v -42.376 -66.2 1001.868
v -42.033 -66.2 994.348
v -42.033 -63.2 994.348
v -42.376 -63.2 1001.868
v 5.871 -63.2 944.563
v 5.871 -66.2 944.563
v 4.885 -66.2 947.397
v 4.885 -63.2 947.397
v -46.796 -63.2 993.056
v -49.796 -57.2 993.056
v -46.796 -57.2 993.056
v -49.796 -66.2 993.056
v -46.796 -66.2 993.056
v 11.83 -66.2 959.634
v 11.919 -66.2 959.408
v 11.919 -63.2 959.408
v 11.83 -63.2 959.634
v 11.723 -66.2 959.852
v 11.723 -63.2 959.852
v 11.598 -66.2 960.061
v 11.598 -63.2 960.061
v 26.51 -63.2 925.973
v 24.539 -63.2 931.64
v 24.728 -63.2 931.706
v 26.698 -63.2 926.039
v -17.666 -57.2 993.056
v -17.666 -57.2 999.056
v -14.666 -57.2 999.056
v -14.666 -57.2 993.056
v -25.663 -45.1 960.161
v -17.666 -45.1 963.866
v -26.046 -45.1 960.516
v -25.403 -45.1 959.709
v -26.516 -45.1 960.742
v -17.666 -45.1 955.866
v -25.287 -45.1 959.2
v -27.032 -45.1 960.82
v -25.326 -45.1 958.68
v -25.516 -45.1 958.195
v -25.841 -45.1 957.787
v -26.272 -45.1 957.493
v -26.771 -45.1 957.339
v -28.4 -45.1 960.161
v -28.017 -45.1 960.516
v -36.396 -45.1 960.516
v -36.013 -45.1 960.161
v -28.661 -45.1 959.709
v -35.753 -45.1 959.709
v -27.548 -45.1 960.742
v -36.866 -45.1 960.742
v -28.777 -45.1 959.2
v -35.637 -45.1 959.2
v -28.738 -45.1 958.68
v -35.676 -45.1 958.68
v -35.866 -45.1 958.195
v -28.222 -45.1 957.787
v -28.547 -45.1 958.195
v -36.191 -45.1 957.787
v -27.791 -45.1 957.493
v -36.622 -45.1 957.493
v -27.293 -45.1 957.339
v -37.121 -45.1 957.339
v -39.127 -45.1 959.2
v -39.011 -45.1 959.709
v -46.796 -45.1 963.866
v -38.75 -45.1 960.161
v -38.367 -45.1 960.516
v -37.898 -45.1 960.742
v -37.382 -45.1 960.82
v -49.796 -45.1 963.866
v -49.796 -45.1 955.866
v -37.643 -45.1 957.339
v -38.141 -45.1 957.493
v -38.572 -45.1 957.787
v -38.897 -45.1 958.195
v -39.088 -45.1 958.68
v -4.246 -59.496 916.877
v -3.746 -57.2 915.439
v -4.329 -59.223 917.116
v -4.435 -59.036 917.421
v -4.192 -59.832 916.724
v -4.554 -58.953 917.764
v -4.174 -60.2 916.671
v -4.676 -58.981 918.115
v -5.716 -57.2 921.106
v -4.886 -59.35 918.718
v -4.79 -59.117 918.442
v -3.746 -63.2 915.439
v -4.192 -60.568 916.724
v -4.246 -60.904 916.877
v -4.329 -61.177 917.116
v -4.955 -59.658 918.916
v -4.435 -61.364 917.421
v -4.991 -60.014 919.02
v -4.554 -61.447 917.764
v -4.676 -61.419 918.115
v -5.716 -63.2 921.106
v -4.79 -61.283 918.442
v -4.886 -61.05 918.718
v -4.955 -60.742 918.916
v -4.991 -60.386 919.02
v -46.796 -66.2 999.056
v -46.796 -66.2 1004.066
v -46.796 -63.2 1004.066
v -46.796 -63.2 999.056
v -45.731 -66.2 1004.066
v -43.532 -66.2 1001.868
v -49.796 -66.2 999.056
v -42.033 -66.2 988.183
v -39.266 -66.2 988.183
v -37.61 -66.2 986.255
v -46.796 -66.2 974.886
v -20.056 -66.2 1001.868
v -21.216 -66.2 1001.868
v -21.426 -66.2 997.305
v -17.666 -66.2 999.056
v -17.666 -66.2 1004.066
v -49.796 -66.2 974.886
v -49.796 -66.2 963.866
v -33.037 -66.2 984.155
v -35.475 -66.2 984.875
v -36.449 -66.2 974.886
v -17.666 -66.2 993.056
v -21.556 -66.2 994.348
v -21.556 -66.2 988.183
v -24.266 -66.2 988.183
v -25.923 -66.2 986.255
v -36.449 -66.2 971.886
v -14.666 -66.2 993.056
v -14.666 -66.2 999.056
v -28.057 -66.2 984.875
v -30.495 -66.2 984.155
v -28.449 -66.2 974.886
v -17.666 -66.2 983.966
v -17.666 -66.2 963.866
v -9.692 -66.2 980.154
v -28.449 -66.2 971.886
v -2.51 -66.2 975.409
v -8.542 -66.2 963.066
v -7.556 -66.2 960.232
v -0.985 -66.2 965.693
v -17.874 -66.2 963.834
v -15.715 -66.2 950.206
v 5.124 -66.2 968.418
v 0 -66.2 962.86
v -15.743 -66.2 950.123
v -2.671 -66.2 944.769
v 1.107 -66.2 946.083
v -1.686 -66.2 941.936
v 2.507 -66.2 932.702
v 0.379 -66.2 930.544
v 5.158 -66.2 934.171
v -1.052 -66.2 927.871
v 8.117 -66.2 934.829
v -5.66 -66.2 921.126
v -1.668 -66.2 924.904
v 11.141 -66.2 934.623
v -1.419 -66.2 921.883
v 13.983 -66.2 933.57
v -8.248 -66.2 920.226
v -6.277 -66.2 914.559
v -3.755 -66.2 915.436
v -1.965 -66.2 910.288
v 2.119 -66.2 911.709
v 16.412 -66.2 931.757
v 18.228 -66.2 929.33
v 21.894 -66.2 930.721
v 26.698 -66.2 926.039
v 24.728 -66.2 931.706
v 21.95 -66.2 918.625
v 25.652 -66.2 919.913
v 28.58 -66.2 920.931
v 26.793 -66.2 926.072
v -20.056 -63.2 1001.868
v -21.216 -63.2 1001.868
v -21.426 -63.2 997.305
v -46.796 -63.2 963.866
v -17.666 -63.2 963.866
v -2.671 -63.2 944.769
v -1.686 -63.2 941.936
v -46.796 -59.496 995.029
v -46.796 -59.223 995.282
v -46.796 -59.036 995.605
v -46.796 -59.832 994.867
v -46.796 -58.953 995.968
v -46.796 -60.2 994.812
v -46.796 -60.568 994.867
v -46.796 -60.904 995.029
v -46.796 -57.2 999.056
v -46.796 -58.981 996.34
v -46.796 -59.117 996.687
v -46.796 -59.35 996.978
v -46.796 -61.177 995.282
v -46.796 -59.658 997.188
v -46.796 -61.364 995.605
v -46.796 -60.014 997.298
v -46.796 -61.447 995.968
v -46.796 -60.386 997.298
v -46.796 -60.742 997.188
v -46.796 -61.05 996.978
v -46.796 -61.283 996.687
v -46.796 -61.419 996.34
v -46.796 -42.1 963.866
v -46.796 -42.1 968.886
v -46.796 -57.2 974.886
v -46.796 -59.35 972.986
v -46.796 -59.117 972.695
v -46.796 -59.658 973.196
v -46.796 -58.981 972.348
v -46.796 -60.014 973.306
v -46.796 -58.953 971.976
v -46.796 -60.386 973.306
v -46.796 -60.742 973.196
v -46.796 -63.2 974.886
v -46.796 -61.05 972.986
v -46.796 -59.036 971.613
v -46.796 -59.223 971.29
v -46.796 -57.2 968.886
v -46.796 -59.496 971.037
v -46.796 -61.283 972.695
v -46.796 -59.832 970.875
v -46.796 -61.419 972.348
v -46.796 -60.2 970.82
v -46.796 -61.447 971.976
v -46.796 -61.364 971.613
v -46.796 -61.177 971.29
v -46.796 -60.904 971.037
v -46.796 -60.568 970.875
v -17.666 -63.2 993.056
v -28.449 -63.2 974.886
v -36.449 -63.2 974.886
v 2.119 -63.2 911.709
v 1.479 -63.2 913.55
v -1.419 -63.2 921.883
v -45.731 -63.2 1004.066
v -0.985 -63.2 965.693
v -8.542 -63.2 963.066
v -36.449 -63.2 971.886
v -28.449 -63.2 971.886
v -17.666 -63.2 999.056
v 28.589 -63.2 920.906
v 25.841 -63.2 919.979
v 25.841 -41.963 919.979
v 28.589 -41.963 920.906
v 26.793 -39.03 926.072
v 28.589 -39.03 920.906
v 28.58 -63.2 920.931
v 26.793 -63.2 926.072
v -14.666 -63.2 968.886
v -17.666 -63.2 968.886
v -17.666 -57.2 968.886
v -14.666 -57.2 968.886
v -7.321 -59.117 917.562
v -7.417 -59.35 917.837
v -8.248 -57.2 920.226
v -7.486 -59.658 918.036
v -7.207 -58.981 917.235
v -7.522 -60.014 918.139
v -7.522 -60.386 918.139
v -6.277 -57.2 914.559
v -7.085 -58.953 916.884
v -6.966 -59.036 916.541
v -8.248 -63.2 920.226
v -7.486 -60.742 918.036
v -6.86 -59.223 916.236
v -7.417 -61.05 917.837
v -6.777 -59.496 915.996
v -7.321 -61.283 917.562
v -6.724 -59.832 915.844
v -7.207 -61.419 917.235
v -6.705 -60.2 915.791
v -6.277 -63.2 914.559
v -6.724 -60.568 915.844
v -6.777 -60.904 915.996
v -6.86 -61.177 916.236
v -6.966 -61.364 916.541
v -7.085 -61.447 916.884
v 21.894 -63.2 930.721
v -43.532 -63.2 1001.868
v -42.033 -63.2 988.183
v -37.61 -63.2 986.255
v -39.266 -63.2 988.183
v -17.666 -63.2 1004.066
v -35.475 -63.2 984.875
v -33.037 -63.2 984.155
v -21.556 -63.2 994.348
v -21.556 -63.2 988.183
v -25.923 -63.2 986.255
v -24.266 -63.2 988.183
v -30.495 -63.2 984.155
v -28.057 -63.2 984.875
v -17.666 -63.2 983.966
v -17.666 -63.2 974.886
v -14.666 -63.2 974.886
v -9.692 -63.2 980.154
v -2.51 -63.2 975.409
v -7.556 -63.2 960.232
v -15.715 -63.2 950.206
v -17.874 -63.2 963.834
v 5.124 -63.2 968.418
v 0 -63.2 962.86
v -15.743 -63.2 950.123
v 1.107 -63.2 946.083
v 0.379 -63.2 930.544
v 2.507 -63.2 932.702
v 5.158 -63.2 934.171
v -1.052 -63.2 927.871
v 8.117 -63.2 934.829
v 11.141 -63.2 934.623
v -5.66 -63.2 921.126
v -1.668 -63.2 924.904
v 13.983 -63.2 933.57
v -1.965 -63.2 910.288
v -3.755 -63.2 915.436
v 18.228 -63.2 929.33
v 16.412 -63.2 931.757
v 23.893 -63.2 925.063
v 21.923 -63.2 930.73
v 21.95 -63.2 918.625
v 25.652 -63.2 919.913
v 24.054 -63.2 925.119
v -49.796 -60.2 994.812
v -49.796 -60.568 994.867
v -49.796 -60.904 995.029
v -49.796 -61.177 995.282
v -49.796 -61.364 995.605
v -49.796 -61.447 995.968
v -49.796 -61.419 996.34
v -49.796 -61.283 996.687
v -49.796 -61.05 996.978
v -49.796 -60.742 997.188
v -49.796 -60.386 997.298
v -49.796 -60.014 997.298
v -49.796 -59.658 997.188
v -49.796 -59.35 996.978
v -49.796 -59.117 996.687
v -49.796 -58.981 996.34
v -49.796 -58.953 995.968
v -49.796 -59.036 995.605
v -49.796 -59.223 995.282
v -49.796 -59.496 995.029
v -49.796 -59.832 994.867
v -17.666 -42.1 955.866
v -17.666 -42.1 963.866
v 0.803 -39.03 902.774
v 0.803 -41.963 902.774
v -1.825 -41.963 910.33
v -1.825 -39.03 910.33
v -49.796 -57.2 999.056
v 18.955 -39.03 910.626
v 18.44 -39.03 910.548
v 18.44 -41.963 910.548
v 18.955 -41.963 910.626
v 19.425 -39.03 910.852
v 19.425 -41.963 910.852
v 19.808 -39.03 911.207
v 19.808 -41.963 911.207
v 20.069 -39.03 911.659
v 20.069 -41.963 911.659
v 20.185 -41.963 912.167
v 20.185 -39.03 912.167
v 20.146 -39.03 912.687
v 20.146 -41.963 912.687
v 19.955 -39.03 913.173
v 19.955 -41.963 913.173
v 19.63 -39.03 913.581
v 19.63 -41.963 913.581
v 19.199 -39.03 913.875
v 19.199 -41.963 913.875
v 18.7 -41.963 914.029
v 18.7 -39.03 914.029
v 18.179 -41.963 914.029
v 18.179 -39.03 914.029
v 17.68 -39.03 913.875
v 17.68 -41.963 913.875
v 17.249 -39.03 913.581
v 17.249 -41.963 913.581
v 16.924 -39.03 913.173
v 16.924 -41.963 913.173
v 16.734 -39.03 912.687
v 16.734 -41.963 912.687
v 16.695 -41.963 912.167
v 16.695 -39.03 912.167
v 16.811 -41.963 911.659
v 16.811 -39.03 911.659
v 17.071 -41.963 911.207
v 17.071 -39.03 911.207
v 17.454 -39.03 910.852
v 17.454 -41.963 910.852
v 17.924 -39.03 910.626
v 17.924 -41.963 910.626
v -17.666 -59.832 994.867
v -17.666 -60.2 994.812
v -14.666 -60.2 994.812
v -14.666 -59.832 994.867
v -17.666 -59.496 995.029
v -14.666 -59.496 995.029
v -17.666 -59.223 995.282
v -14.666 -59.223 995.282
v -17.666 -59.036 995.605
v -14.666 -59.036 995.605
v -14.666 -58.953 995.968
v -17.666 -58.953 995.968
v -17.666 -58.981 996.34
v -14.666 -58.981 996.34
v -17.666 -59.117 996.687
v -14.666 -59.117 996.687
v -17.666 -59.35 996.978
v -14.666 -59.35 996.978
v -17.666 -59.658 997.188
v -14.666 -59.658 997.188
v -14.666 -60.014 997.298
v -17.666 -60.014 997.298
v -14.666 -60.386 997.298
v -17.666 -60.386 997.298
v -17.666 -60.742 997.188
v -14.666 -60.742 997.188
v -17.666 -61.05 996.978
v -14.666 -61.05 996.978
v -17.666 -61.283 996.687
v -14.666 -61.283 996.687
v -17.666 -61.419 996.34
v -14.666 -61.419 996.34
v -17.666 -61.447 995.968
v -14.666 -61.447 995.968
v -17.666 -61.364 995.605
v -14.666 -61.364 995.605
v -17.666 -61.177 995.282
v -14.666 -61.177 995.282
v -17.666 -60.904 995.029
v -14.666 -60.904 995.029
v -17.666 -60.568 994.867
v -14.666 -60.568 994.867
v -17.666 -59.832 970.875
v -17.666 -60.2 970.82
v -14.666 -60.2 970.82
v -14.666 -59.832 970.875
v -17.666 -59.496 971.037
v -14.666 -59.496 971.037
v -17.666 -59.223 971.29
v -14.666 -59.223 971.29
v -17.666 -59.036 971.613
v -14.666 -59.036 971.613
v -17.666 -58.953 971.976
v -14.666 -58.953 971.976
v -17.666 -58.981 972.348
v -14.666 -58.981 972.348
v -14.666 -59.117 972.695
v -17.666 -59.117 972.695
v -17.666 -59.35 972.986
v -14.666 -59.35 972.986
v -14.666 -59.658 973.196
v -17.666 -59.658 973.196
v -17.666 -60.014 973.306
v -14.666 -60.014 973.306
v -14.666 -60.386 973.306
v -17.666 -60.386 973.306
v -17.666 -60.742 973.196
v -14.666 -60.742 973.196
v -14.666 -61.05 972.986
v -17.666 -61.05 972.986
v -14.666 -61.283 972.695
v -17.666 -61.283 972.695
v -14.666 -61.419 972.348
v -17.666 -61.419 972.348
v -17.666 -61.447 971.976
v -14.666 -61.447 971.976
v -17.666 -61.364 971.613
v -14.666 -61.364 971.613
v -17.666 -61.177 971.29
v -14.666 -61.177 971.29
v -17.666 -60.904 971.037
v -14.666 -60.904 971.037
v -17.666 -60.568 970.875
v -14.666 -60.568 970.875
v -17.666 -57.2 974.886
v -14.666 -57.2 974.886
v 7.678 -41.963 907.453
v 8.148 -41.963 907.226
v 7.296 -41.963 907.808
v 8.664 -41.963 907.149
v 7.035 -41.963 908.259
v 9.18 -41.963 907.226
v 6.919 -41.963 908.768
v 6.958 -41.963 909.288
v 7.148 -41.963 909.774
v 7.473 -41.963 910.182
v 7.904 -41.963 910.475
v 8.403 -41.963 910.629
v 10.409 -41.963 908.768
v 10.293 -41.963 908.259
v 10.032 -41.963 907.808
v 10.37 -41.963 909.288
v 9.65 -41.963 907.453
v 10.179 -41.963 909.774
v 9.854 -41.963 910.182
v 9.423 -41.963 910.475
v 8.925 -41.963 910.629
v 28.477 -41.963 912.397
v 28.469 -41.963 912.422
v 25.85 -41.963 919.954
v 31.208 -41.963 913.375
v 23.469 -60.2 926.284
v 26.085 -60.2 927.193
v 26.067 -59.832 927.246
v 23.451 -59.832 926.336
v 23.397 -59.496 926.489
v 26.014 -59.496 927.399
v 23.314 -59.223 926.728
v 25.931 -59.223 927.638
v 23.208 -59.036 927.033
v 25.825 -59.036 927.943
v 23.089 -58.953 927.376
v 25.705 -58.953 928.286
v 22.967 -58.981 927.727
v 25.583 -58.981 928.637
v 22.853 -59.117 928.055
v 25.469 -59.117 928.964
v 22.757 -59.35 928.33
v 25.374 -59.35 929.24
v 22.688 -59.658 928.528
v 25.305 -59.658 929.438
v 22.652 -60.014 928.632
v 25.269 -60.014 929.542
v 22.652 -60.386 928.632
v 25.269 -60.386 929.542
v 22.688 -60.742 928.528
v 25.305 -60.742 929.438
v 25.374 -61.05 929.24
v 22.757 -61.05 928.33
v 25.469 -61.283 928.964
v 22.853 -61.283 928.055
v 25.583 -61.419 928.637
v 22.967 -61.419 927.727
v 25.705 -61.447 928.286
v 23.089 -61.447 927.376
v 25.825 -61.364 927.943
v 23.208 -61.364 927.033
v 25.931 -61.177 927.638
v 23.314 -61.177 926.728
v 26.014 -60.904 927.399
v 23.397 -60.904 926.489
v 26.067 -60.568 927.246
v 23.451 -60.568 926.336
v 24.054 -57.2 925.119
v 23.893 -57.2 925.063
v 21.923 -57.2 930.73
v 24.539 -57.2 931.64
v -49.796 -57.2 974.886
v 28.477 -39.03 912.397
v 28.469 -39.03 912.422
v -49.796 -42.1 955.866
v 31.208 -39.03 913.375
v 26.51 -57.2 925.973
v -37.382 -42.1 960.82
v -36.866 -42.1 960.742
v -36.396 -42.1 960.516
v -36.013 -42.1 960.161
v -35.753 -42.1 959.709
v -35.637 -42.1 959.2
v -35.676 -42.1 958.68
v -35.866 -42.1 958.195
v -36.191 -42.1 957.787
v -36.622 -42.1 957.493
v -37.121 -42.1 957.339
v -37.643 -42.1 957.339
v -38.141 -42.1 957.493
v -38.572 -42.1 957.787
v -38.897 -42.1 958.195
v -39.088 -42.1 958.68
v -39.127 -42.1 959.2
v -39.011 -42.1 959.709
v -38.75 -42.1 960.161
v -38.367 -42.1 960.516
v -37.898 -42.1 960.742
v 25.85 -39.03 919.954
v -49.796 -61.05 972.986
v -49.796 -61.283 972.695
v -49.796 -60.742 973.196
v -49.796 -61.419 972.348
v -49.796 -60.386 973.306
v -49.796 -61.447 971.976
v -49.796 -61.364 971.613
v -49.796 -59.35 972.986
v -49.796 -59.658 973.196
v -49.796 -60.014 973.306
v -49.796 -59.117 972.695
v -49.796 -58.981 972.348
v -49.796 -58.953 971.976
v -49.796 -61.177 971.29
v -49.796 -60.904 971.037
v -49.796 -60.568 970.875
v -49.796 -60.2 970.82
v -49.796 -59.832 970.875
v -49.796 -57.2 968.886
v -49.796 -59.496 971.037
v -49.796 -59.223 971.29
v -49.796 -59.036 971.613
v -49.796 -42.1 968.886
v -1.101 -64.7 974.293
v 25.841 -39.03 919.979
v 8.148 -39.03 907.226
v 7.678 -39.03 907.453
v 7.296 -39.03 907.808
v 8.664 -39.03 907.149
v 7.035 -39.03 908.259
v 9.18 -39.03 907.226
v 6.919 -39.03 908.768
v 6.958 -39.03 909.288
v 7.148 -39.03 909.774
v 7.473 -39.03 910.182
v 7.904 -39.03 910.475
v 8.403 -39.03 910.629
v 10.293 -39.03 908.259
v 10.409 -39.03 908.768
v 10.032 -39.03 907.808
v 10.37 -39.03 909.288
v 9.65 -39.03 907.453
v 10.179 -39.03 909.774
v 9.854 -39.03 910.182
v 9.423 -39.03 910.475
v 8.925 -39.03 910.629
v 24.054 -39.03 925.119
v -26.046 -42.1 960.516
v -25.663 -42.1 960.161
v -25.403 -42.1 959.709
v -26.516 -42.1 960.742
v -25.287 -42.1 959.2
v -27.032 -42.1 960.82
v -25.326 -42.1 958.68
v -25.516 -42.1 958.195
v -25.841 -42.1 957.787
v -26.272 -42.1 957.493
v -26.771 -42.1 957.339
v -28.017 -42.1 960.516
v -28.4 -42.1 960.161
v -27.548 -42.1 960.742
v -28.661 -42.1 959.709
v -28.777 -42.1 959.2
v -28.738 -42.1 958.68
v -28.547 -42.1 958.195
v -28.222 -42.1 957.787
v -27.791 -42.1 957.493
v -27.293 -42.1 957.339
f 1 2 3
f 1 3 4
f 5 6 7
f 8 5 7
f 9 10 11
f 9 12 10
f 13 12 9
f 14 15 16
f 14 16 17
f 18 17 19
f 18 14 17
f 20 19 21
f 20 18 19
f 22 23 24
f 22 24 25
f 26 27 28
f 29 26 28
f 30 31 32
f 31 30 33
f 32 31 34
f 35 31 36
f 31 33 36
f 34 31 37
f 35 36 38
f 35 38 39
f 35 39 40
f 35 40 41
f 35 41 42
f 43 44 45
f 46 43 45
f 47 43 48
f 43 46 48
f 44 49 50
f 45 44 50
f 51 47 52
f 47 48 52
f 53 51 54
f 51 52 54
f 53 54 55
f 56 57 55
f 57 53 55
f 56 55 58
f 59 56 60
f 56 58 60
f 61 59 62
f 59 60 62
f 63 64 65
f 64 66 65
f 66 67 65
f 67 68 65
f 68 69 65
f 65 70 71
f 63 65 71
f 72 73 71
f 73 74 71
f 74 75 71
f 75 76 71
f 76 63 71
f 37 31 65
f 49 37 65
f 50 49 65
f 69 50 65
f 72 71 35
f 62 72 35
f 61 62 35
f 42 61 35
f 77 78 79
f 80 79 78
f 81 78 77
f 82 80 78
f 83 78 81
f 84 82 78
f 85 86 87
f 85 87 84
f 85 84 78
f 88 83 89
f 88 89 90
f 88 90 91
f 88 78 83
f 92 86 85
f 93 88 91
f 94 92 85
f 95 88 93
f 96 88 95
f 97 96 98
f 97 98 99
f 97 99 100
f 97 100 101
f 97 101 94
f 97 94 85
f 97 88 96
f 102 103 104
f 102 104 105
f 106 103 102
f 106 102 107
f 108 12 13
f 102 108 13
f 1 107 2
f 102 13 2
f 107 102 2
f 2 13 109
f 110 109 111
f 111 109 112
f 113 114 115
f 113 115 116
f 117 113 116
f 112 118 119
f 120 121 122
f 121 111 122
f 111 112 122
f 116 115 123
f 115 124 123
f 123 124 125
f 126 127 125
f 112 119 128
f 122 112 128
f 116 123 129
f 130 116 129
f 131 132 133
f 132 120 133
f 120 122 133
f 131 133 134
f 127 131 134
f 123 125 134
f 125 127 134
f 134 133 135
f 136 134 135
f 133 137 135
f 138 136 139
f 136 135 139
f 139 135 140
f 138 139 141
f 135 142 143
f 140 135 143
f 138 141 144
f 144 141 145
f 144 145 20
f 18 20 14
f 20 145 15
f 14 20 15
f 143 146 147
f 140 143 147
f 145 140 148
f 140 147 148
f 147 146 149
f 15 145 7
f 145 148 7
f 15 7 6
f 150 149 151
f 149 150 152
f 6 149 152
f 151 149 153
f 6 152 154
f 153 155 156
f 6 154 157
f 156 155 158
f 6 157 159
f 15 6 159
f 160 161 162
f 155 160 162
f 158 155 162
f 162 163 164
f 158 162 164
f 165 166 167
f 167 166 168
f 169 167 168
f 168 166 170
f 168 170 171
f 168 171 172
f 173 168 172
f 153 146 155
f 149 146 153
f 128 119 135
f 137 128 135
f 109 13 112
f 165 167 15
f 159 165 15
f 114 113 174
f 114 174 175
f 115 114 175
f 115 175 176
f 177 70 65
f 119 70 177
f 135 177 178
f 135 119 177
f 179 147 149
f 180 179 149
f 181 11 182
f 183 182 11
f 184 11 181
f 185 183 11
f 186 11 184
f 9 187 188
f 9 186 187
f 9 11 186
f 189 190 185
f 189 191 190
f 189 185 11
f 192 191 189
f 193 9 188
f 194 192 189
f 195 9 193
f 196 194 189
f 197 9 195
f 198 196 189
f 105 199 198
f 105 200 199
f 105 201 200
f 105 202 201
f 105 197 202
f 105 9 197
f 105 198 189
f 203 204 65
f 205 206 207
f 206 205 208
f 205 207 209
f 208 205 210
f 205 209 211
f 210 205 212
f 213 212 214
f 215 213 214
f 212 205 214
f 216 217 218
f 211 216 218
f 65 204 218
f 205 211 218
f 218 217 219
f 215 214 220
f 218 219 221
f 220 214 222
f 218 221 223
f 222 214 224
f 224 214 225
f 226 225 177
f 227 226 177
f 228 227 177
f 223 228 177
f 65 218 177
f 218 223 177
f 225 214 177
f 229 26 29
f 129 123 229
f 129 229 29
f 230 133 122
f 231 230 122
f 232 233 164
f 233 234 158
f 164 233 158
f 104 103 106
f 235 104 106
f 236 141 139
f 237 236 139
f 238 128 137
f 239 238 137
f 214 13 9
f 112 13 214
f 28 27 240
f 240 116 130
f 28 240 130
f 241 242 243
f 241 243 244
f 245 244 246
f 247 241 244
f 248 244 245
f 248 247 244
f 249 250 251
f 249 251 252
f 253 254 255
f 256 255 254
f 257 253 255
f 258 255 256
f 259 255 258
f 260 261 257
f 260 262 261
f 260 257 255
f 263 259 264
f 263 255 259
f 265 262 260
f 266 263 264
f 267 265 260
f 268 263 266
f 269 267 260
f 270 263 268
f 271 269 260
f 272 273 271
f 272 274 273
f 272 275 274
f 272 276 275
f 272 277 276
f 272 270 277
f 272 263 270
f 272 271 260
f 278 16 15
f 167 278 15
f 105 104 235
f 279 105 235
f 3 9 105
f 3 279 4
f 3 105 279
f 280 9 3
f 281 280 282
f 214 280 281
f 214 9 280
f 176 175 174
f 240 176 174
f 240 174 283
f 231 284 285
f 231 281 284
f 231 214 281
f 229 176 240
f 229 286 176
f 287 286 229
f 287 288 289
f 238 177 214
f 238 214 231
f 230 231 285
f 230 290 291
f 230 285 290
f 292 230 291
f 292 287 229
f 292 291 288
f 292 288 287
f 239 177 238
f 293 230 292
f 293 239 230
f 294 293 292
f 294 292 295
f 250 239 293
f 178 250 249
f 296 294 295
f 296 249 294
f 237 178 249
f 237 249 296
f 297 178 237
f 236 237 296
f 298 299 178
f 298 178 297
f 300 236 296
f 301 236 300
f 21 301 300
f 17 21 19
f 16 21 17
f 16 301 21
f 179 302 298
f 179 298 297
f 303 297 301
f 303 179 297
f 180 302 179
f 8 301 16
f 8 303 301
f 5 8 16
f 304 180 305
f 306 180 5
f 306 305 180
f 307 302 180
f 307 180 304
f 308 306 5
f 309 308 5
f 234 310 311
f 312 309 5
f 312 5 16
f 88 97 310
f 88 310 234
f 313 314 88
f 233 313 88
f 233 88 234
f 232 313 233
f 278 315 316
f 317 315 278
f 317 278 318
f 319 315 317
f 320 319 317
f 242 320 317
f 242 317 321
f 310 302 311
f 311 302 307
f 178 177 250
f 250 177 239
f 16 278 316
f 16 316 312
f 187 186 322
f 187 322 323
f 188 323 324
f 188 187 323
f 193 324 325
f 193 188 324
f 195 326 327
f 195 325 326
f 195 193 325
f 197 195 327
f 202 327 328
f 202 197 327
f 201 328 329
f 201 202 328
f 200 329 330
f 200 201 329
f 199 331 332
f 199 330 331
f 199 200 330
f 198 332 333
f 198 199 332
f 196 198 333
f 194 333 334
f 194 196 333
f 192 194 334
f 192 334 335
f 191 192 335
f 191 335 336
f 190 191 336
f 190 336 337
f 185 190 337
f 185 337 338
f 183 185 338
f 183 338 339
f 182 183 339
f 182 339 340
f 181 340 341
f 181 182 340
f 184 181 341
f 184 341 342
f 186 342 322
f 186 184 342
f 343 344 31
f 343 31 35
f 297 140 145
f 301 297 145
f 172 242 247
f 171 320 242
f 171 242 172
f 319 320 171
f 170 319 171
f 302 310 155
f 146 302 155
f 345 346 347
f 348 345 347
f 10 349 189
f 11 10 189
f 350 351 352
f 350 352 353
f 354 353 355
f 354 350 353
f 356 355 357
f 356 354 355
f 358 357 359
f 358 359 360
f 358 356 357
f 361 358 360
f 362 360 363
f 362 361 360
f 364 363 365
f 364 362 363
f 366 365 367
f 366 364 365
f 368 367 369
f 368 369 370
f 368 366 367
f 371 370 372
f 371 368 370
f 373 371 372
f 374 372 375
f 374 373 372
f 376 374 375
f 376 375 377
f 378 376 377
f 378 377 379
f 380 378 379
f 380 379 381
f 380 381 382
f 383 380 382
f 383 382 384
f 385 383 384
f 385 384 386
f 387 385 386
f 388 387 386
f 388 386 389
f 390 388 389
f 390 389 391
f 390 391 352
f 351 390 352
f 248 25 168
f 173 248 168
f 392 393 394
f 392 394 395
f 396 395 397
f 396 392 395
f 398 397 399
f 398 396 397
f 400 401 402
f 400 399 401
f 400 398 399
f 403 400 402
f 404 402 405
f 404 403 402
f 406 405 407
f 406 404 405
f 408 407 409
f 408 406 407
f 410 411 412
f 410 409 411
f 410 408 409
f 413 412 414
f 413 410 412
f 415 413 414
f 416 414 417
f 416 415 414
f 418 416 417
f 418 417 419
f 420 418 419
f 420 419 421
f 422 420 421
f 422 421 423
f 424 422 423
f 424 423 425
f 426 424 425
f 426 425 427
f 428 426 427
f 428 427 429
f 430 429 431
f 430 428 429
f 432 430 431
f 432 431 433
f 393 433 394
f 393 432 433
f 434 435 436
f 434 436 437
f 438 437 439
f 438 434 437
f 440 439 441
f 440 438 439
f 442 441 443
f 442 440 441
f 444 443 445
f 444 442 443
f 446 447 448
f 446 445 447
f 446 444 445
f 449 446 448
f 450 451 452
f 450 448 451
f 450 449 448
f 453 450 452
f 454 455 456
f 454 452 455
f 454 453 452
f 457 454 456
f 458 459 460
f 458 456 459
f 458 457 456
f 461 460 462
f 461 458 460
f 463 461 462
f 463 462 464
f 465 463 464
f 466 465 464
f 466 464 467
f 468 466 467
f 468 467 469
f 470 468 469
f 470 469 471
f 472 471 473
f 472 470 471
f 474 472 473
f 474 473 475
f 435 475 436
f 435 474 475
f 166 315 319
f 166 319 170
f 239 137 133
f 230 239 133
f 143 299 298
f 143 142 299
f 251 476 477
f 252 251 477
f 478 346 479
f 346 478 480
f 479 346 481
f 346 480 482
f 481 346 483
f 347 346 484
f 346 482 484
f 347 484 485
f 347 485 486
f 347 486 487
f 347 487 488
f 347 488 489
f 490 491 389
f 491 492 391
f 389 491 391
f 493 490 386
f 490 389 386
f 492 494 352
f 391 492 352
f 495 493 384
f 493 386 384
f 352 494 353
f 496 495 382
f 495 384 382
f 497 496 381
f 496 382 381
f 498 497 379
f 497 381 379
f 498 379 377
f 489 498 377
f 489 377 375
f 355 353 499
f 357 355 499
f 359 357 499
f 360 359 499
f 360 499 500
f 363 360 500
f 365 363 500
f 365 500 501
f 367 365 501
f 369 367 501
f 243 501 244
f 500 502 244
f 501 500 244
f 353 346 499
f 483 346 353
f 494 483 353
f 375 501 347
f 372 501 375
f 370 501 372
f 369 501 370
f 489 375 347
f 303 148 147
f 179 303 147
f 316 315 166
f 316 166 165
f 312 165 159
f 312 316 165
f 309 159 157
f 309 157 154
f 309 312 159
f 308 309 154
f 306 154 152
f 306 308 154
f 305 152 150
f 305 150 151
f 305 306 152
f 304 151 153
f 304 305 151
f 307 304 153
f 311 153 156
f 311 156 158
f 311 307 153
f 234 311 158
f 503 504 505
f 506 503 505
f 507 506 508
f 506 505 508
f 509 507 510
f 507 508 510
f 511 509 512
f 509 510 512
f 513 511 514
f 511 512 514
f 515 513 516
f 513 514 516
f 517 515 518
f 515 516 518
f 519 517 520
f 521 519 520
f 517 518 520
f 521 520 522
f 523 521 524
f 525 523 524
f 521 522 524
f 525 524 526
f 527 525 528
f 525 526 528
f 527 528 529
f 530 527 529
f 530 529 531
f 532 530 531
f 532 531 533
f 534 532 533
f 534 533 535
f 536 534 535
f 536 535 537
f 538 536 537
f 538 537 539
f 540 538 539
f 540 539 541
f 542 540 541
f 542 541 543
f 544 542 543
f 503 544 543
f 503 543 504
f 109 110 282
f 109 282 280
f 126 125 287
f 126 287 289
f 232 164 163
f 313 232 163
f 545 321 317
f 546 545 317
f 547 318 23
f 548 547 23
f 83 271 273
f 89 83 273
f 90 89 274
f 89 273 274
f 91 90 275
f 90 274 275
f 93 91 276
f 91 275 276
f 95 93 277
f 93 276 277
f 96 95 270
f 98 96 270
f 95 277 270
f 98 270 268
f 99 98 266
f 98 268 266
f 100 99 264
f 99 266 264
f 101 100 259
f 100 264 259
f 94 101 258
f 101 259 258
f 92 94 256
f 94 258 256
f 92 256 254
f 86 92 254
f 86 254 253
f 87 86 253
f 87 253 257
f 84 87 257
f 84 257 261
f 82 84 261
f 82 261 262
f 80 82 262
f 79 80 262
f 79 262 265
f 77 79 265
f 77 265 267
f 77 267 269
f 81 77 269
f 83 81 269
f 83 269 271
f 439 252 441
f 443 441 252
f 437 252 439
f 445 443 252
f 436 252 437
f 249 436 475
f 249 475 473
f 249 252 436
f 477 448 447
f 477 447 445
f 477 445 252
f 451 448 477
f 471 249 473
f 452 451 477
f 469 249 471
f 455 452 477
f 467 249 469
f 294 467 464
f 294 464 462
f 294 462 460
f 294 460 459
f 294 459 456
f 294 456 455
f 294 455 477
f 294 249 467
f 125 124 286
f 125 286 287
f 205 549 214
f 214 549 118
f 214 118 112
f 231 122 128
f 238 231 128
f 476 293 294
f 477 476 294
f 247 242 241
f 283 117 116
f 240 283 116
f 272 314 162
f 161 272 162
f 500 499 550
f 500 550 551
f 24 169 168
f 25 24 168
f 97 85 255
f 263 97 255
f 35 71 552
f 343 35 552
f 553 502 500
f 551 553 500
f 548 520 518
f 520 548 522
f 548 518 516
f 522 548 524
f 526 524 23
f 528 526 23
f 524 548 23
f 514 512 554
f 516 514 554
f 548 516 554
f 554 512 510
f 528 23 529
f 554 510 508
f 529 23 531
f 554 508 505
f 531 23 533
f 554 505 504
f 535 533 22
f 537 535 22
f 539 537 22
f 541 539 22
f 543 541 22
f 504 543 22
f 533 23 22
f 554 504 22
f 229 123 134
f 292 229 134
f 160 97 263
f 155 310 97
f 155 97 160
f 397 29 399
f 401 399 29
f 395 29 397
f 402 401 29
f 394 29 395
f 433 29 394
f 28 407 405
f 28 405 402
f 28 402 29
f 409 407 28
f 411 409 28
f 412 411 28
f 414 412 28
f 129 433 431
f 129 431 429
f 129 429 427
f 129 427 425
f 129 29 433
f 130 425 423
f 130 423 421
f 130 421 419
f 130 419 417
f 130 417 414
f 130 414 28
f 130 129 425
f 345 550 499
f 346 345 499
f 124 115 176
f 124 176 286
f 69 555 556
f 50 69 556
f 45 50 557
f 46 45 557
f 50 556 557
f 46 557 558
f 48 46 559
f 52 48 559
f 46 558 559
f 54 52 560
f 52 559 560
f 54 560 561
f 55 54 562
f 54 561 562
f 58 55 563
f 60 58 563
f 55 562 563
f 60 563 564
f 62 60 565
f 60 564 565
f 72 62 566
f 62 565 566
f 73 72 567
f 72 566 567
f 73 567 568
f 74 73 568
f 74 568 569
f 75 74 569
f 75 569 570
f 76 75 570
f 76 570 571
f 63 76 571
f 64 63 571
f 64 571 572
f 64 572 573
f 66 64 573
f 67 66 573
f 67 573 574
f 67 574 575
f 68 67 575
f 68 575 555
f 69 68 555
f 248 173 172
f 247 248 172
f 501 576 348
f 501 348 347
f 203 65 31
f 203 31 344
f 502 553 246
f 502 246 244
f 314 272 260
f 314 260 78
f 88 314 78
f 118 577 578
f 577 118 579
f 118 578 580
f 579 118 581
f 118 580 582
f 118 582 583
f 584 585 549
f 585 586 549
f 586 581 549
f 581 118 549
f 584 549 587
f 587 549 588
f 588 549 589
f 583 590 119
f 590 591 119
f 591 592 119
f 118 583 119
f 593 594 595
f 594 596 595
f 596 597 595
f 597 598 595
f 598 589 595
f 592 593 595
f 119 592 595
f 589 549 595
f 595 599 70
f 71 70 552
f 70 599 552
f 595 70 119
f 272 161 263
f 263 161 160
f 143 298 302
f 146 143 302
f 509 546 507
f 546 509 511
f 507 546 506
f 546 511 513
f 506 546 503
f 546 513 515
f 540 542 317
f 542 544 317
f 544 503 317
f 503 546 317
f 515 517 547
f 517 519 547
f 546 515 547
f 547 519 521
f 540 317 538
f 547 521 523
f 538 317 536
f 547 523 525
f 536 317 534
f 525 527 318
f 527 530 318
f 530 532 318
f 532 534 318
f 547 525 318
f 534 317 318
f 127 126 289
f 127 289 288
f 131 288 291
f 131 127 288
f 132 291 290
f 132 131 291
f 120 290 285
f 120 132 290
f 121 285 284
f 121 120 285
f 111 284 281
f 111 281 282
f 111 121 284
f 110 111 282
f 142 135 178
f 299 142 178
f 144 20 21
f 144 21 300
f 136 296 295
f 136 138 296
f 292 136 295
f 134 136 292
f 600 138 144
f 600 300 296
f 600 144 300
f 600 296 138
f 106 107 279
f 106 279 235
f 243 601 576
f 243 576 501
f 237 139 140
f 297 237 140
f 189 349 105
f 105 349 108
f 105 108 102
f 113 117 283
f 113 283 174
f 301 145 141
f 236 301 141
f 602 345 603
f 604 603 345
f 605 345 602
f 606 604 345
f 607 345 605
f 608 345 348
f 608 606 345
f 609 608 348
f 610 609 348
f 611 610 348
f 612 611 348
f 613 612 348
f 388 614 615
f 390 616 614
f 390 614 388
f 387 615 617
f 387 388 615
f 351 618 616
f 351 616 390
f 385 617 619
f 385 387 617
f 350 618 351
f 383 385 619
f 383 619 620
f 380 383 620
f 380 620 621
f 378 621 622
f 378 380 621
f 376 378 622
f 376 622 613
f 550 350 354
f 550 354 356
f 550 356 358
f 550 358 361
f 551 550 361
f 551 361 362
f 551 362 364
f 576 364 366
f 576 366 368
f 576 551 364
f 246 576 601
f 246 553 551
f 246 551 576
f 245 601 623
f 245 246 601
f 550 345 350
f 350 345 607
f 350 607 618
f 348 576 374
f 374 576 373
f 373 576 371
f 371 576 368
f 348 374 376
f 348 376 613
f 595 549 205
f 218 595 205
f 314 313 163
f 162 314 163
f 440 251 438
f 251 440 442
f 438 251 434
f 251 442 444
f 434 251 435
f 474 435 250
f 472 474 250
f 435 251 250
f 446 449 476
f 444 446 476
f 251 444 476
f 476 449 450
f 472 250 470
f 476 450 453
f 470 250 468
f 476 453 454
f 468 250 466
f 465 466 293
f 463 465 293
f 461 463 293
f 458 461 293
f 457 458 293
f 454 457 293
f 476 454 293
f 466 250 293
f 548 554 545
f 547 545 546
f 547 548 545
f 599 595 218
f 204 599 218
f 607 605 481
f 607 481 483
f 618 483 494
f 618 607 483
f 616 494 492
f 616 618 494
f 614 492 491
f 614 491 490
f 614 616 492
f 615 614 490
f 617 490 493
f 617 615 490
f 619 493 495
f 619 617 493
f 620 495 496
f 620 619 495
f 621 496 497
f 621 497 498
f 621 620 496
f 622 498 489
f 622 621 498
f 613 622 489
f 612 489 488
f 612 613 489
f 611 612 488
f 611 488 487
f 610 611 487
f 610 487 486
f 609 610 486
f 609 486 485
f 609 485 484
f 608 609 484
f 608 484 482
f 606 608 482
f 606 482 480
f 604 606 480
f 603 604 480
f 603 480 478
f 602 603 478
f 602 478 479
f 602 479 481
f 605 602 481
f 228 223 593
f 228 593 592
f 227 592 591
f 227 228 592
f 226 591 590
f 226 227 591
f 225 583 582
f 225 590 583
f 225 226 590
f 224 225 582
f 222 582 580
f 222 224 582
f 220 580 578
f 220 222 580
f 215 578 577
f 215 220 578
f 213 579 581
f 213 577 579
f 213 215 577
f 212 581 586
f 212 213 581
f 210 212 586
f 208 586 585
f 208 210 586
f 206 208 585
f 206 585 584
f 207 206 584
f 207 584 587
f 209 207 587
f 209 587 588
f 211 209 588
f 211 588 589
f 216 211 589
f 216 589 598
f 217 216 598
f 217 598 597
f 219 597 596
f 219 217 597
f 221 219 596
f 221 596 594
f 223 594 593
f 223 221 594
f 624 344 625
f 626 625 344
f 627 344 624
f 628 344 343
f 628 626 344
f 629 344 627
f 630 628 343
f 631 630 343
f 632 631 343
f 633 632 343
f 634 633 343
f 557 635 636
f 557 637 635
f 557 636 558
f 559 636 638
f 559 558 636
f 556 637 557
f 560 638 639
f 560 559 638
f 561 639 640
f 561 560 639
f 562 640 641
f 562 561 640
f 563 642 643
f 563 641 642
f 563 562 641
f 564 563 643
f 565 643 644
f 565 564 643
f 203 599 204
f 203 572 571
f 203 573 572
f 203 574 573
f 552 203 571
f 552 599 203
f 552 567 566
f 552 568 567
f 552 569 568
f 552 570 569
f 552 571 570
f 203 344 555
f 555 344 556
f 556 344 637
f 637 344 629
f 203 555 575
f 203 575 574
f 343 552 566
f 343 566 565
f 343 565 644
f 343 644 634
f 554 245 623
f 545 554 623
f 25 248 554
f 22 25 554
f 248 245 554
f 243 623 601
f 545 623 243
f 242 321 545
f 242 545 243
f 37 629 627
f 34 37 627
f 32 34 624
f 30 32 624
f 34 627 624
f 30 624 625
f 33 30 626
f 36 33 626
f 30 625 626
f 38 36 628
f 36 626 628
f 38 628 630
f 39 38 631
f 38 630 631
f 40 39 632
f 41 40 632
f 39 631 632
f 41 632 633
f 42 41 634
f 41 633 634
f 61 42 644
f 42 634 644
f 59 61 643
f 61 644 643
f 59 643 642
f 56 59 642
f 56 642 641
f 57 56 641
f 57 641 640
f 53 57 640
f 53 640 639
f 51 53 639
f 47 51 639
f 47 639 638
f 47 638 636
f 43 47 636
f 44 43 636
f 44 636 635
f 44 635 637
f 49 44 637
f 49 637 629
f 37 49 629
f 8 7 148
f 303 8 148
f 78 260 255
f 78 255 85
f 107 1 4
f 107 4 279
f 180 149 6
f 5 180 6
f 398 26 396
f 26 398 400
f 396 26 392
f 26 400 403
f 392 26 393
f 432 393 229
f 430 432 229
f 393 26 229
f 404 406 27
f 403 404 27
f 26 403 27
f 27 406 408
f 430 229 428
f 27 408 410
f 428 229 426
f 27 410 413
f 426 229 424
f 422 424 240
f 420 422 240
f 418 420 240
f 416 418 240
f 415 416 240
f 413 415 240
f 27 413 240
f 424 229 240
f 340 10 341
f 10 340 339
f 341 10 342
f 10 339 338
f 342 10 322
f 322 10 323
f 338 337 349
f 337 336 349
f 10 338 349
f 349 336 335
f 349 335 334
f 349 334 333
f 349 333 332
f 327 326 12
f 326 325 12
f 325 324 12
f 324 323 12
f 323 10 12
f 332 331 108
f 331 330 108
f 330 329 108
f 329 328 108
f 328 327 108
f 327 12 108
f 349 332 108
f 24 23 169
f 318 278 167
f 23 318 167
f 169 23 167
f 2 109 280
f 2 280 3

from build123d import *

# Parameters (mm, degrees)
SKETCH1_W                 = 29.13
SKETCH1_H                 = 40.2
BOSS_EXTRUDE1_DEPTH       = 3
SKETCH3_W                 = 6
SKETCH3_H                 = 3
BOSS_EXTRUDE2_DEPTH       = 3
SKETCH4_W                 = 3
SKETCH4_H                 = 6
BOSS_EXTRUDE3_DEPTH       = 6
SKETCH6_W                 = 6
SKETCH6_H                 = 3
BOSS_EXTRUDE4_DEPTH       = 5
SKETCH7_W                 = 3.000000005
SKETCH7_H                 = 6
BOSS_EXTRUDE6_DEPTH       = 6
SKETCH11_W                = 6
SKETCH11_H                = 3
BOSS_EXTRUDE7_DEPTH       = 3
SKETCH19_W                = 3
SKETCH19_H                = 6
BOSS_EXTRUDE11_DEPTH      = 6
SKETCH21_W                = 6
SKETCH21_H                = 3
BOSS_EXTRUDE12_DEPTH      = 3
SKETCH22_W                = 3
SKETCH22_H                = 6
BOSS_EXTRUDE13_DEPTH      = 6
CUT_EXTRUDE11_DEPTH       = 4
SKETCH30_W                = 25.92
SKETCH30_H                = 3
CUT_EXTRUDE12_DEPTH       = 15
SKETCH33_W                = 29.17650364
SKETCH33_H                = 3
BOSS_EXTRUDE14_DEPTH      = 40.3
SKETCH34_W                = 21.00258235
SKETCH34_H                = 3
CUT_EXTRUDE15_DEPTH       = 25
CUT_EXTRUDE16_DEPTH       = 5
SKETCH37_W                = 4.5
SKETCH37_H                = 3
SKETCH37_W_2              = 1.5
BOSS_EXTRUDE15_DEPTH      = 3
BOSS_EXTRUDE16_DEPTH      = 6
SKETCH41_W                = 6
SKETCH41_H                = 3
BOSS_EXTRUDE17_DEPTH      = 3
BOSS_EXTRUDE18_DEPTH      = 6
SKETCH46_W                = 5.02
SKETCH46_H                = 3
BOSS_EXTRUDE19_DEPTH      = 3
SKETCH48_W                = 3
SKETCH48_H                = 5.02
BOSS_EXTRUDE20_DEPTH      = 21.1
BOSS_EXTRUDE22_DEPTH      = 29.13
BOSS_EXTRUDE22_DEPTH_BACK = 3
SKETCH50_W                = 8
SKETCH50_H                = 3
SKETCH51_R                = 1.75
CUT_EXTRUDE21_DEPTH       = 5
SKETCH56_W                = 3.994197227
SKETCH56_H                = 3.994197227
CUT_EXTRUDE26_DEPTH       = 0.1
FILLET4_START             = -19
FILLET4_DEPTH             = 5
BOSS_EXTRUDE28_DEPTH      = 0.21
BOSS_EXTRUDE29_DEPTH      = 3
BOSS_EXTRUDE30_DEPTH      = 1.95
BOSS_EXTRUDE30_DEPTH_BACK = 4
SKETCH68_W                = 4.32399603
SKETCH68_H                = 3
SKETCH69_W                = 3.919724064
SKETCH69_H                = 3
BOSS_EXTRUDE31_DEPTH      = 1.83
SKETCH70_W                = 5.44243662
SKETCH70_H                = 3
BOSS_EXTRUDE32_DEPTH      = 3.1
BOSS_EXTRUDE33_DEPTH      = 24.17
SKETCH72_W                = 2.9
SKETCH72_H                = 2.93342148
BOSS_EXTRUDE34_DEPTH      = 8
SKETCH73_W                = 8
SKETCH73_H                = 2.93342148
BOSS_EXTRUDE35_DEPTH      = 29.3
SKETCH74_R                = 1.749999995
CUT_EXTRUDE27_DEPTH       = 5
CUT_EXTRUDE28_DEPTH       = 5
CUT_EXTRUDE28_DEPTH_BACK  = 5
SKETCH75_R                = 1.25
SKETCH75_R_2              = 1.249999999
CUT_EXTRUDE29_DEPTH       = 5
CUT_EXTRUDE29_DEPTH_BACK  = 5
SKETCH76_R                = 1.25
SKETCH77_R                = 1.25
CUT_EXTRUDE30_DEPTH       = 5
SKETCH78_R                = 1.25
CUT_EXTRUDE31_DEPTH       = 5
BOSS_EXTRUDE36_DEPTH      = 3
BOSS_EXTRUDE38_DEPTH      = 3
CUT_EXTRUDE32_DEPTH       = 10
CUT_EXTRUDE33_DEPTH       = 10
CUT_EXTRUDE34_DEPTH       = 10


with BuildPart() as part:
    # Sketch1 → Boss-Extrude1 (new body)
    with BuildSketch(Plane(origin=(0, 0, 0), x_dir=(1, 0, 0), z_dir=(0, 1, 0))):
        with Locations((-32.231128585, -983.966354464)):
            Rectangle(SKETCH1_W, SKETCH1_H)
        with BuildLine():
            Line((-15.507778999, -950.239071497), (-17.666128585, -963.866354464))
            Line((-17.666128585, -963.866354464), (-17.666128585, -983.966354464))
            add(Edge.make_bspline(
                [(11.825950039, -959.709415703), (1.028086592, -976.494542347), (-17.666128585, -983.966354464)],
                knots=[0, 0, 0, 1, 1, 1], degree=2))
            Line((11.825950039, -959.709415703), (-15.497121464, -950.208422428))
            Line((-15.497121464, -950.208422428), (-15.507778999, -950.239071497))
        make_face()
    extrude(amount=-BOSS_EXTRUDE1_DEPTH)

    # Sketch3 → Boss-Extrude2 (add)
    with BuildSketch(Plane.ZY.offset(46.796128585)):
        with Locations((971.886354464, -1.5)):
            Rectangle(SKETCH3_W, SKETCH3_H)
    extrude(amount=BOSS_EXTRUDE2_DEPTH)

    # Sketch4 → Boss-Extrude3 (add)
    with BuildSketch(Plane.XZ.offset(3)):
        with Locations((-48.296128585, 971.886354464)):
            Rectangle(SKETCH4_W, SKETCH4_H)
    extrude(amount=BOSS_EXTRUDE3_DEPTH)

    # Sketch6 → Boss-Extrude4 (add)
    with BuildSketch(Plane(origin=(-17.666128585, 0, 0), x_dir=(0, 0, -1), z_dir=(1, 0, 0))):
        with Locations((-971.886354464, -1.5)):
            Rectangle(SKETCH6_W, SKETCH6_H)
    extrude(amount=BOSS_EXTRUDE4_DEPTH)

    # Sketch7 → Boss-Extrude6 (add)
    with BuildSketch(Plane.XZ.offset(3)):
        with Locations((-16.166128583, 971.886354464)):
            Rectangle(SKETCH7_W, SKETCH7_H)
    extrude(amount=BOSS_EXTRUDE6_DEPTH)

    # Sketch11 → Boss-Extrude7 (add)
    with BuildSketch(Plane.ZY.offset(46.796128585)):
        with Locations((996.056354464, -1.5)):
            Rectangle(SKETCH11_W, SKETCH11_H)
    extrude(amount=BOSS_EXTRUDE7_DEPTH)

    # Sketch19 → Boss-Extrude11 (add)
    with BuildSketch(Plane.XZ.offset(3)):
        with Locations((-48.296128585, 996.056354464)):
            Rectangle(SKETCH19_W, SKETCH19_H)
    extrude(amount=BOSS_EXTRUDE11_DEPTH)

    # Sketch21 → Boss-Extrude12 (add)
    with BuildSketch(Plane(origin=(-17.666128585, 0, 0), x_dir=(0, 0, -1), z_dir=(1, 0, 0))):
        with Locations((-996.056354464, -1.5)):
            Rectangle(SKETCH21_W, SKETCH21_H)
    extrude(amount=BOSS_EXTRUDE12_DEPTH)

    # Sketch22 → Boss-Extrude13 (add)
    with BuildSketch(Plane.XZ.offset(3)):
        with Locations((-16.166128585, 996.056354464)):
            Rectangle(SKETCH22_W, SKETCH22_H)
    extrude(amount=BOSS_EXTRUDE13_DEPTH)

    # Sketch29 → Cut-Extrude11 (cut)
    with BuildSketch(Plane(origin=(0, 0, 0), x_dir=(1, 0, 0), z_dir=(0, 1, 0))):
        Polygon((-39.266128585, -988.183184315), (-42.032837695, -988.183184315), (-42.032837695, -994.347976596), (-42.376382193, -1001.868057312), (-43.532474114, -1001.868057312), (-45.730771266, -1004.066354464), (-39.266128585, -1004.066354464), align=None)
        Polygon((-24.371913352, -988.183184315), (-24.371913352, -1004.066354464), (-24.326128585, -1004.066354464), (-17.666128585, -1004.066354464), (-20.056128585, -1001.868057312), (-21.216128585, -1001.868057312), (-21.426128585, -997.305136389), (-21.556128585, -994.347976596), (-21.556128585, -988.183184315), align=None)
    extrude(amount=-CUT_EXTRUDE11_DEPTH, mode=Mode.SUBTRACT)

    # Sketch30 → Cut-Extrude12 (cut)
    with BuildSketch(Plane.ZY.offset(39.266128585)):
        with Locations((991.106354464, -1.5)):
            Rectangle(SKETCH30_W, SKETCH30_H)
    extrude(amount=-CUT_EXTRUDE12_DEPTH, mode=Mode.SUBTRACT)

    # Sketch33 → Boss-Extrude14 (add)
    with BuildSketch(Plane(origin=(-296.443416752, 0, 852.515567448), x_dir=(-0.9445255798324886, 0, -0.32843786176703366), z_dir=(0.3284378617670337, 0, -0.9445255798324887))):
        with Locations((-311.77524668, -1.5)):
            Rectangle(SKETCH33_W, SKETCH33_H)
    extrude(amount=BOSS_EXTRUDE14_DEPTH)

    # Sketch34 → Cut-Extrude15 (cut)
    with BuildSketch(Plane(origin=(-283.207370923, 0, 814.451186581), x_dir=(-0.9445255798324887, 0, -0.32843786176703327), z_dir=(0.32843786176703327, 0, -0.9445255798324887))):
        with Locations((-311.942483261, -1.5)):
            Rectangle(SKETCH34_W, SKETCH34_H)
    extrude(amount=-CUT_EXTRUDE15_DEPTH, mode=Mode.SUBTRACT)

    # Sketch35 → Cut-Extrude16 (cut)
    with BuildSketch(Plane(origin=(0, 0, 0), x_dir=(1, 0, 0), z_dir=(0, 1, 0))):
        Polygon((-6.699400727, -937.069026653), (11.67040627, -948.187810964), (13.138075545, -943.967069892), align=None)
    extrude(amount=-CUT_EXTRUDE16_DEPTH, mode=Mode.SUBTRACT)

    # Sketch37 → Boss-Extrude15 (add)
    with BuildSketch(Plane(origin=(280.946295288, 0, 97.69285498), x_dir=(-0.32843786176743117, 0, 0.9445255798323505), z_dir=(-0.9445255798323505, 0, -0.32843786176743117))):
        with Locations((868.136002588, -1.5)):
            Rectangle(SKETCH37_W, SKETCH37_H)
        with Locations((871.136002588, -1.5)):
            Rectangle(SKETCH37_W_2, SKETCH37_H)
    extrude(amount=BOSS_EXTRUDE15_DEPTH)

    # Sketch39 → Boss-Extrude16 (add)
    with BuildSketch(Plane.XZ.offset(3)):
        Polygon((-6.277028676, 914.559020058), (-3.745700122, 915.439233528), (-5.716327292, 921.106387007), (-8.247655846, 920.226173537), align=None)
    extrude(amount=BOSS_EXTRUDE16_DEPTH)

    # Sketch41 → Boss-Extrude17 (add)
    with BuildSketch(Plane(origin=(308.258672657, 0, 107.190129606), x_dir=(0.3284378617670337, 0, -0.9445255798324887), z_dir=(0.9445255798324887, 0, 0.3284378617670337))):
        with Locations((-868.898439213, -1.5)):
            Rectangle(SKETCH41_W, SKETCH41_H)
    extrude(amount=BOSS_EXTRUDE17_DEPTH)

    # Sketch42 → Boss-Extrude18 (add)
    with BuildSketch(Plane.XZ.offset(3)):
        Polygon((23.893176542, 925.063208116), (21.922549371, 930.730361595), (24.538885227, 931.640134472), (26.509512398, 925.972980993), align=None)
    extrude(amount=BOSS_EXTRUDE18_DEPTH)


with BuildPart() as body_2:
    # Mirror1: mirrored copy
    add(part.part.mirror(Plane(origin=(0, -9, 0), x_dir=(0, 0, 1), z_dir=(0, -1, 0))))

    # Sketch46 → Boss-Extrude19 (add)
    with BuildSketch(Plane.ZY.offset(46.796128585)):
        with Locations((966.376354464, -16.5)):
            Rectangle(SKETCH46_W, SKETCH46_H)
    extrude(amount=BOSS_EXTRUDE19_DEPTH)

    # Sketch48 → Boss-Extrude20 (add)
    with BuildSketch(Plane(origin=(0, -15, 0), x_dir=(1, 0, 0), z_dir=(0, 1, 0))):
        with Locations((-48.296128585, -966.376354464)):
            Rectangle(SKETCH48_W, SKETCH48_H)
    extrude(amount=BOSS_EXTRUDE20_DEPTH)

    # Sketch50 → Boss-Extrude22 (add, two sides: drawn at the far end of the back side and taken through both)
    with BuildSketch(Plane(origin=(-46.796128585, 0, 0), x_dir=(0, 0, -1), z_dir=(1, 0, 0)).offset(-BOSS_EXTRUDE22_DEPTH_BACK)):
        with Locations((-959.866354464, 4.6)):
            Rectangle(SKETCH50_W, SKETCH50_H)
    extrude(amount=BOSS_EXTRUDE22_DEPTH + BOSS_EXTRUDE22_DEPTH_BACK)

    # Sketch51 → Cut-Extrude21 (cut)
    with BuildSketch(Plane(origin=(0, 6.1, 0), x_dir=(1, 0, 0), z_dir=(0, 1, 0))):
        with Locations(Location((-37.381683329, -959.069638856, 0), (0, 0, 270))):
            Circle(SKETCH51_R)
        with Locations(Location((-27.031683329, -959.069638856, 0), (0, 0, 270))):
            Circle(SKETCH51_R)
    extrude(amount=-CUT_EXTRUDE21_DEPTH, mode=Mode.SUBTRACT)

    # Sketch56 → Cut-Extrude26 (cut)
    with BuildSketch(Plane(origin=(-283.207370923, 0, 814.451186581), x_dir=(-0.9445255798324892, 0, -0.32843786176703227), z_dir=(0.32843786176703227, 0, -0.9445255798324892))):
        with Locations((-299.444093473, -16.997098614)):
            Rectangle(SKETCH56_W, SKETCH56_H)
    extrude(amount=-CUT_EXTRUDE26_DEPTH, mode=Mode.SUBTRACT)

    # Fillet4: read off the stored shape, not the designer's step
    # Fillet4 outline → Fillet4 (cut)
    with BuildSketch(Plane(origin=(0, 0, 0), x_dir=(1, 0, 0), z_dir=(0, 1, 0)).offset(FILLET4_START)):
        with BuildLine():
            Line((11.815255904, -959.705697054), (11.918892326, -959.407658179))
            ThreePointArc((11.918892326, -959.407658179), (11.77847749, -959.744040081), (11.598302874, -960.060909482))
            add(Edge.make_bspline(
                [(11.825950039, -959.709415703), (11.712561825, -959.885676085), (11.598302874, -960.060909482)],
                knots=[0, 0, 0, 0.010500986, 0.010500986, 0.010500986], degree=2))
            Line((11.825950039, -959.709415703), (11.815255904, -959.705697054))
        make_face()
    extrude(amount=FILLET4_DEPTH, mode=Mode.SUBTRACT)


with BuildPart() as body_2_2:
    # Mirror2: mirrored copy
    add(body_2.part.mirror(Plane(origin=(-13.851466716, -18, 962.430133816), x_dir=(0, 0, 1), z_dir=(0, -1, 0))))

    # Sketch63 → Boss-Extrude28 (add)
    with BuildSketch(Plane(origin=(131.691734271, 0, 20.857921628), x_dir=(-0.15643446504022615, 0, 0.9876883405951385), z_dir=(-0.9876883405951385, 0, -0.15643446504022615))):
        with BuildLine():
            add(Edge.make_bspline(
                [(954.763151571, -21), (947.864577189, -21), (940.966002807, -21)],
                knots=[0, 0, 0, 1, 1, 1], degree=2))
            Line((940.966002807, -21), (940.966002807, -18))
            add(Edge.make_bspline(
                [(954.763151571, -18), (947.864577189, -18), (940.966002807, -18)],
                knots=[0, 0, 0, 1, 1, 1], degree=2))
            Line((954.763151571, -18), (954.763151571, -21))
        make_face()
    extrude(amount=BOSS_EXTRUDE28_DEPTH)

    # Sketch67 → Boss-Extrude29 (add)
    with BuildSketch(Plane(origin=(0, -18, 0), x_dir=(1, 0, 0), z_dir=(0, 1, 0))):
        Polygon((-15.715193551, -950.206220259), (-15.742698114, -950.123028585), (-15.497121464, -950.208422428), (-15.507778999, -950.239071497), align=None)
    extrude(amount=-BOSS_EXTRUDE29_DEPTH)

    # Sketch68 → Boss-Extrude30 (add, two sides: drawn at the far end of the back side and taken through both)
    with BuildSketch(Plane(origin=(-283.240214709, 0, 814.545639139), x_dir=(-0.9445255798324883, -3.1744861168227707e-15, -0.32843786176703493), z_dir=(0.32843786176703493, -9.129225613729643e-15, -0.9445255798324883)).offset(-BOSS_EXTRUDE30_DEPTH_BACK)):
        with Locations((-299.279194071, -19.5)):
            Rectangle(SKETCH68_W, SKETCH68_H)
    extrude(amount=BOSS_EXTRUDE30_DEPTH + BOSS_EXTRUDE30_DEPTH_BACK)

    # Sketch69 → Boss-Extrude31 (add)
    with BuildSketch(Plane(origin=(-283.207370923, 0, 814.451186581), x_dir=(-0.9445255798324895, 0, -0.32843786176703144), z_dir=(0.32843786176703144, 0, -0.9445255798324895))):
        with Locations((-324.403636468, -19.5)):
            Rectangle(SKETCH69_W, SKETCH69_H)
    extrude(amount=BOSS_EXTRUDE31_DEPTH)

    # Sketch70 → Boss-Extrude32 (add)
    with BuildSketch(Plane(origin=(308.258672657, 0, 107.190129606), x_dir=(0.3284378617670337, 0, -0.9445255798324887), z_dir=(0.9445255798324887, 0, 0.3284378617670337))):
        with Locations((-863.177220903, -19.5)):
            Rectangle(SKETCH70_W, SKETCH70_H)
    extrude(amount=BOSS_EXTRUDE32_DEPTH)

    # Sketch71 → Boss-Extrude33 (add)
    with BuildSketch(Plane.XZ.offset(21)):
        Polygon((28.589002033, 920.906174309), (26.792870072, 926.071512351), (24.05374589, 925.119042552), (25.841248137, 919.978521948), align=None)
    extrude(amount=BOSS_EXTRUDE33_DEPTH)

    # Sketch72 → Boss-Extrude34 (add)
    with BuildSketch(Plane(origin=(-282.606329636, 0, 812.722704769), x_dir=(-0.9445255798324861, 0, -0.3284378617670412), z_dir=(0.3284378617670412, 0, -0.9445255798324861))):
        with Locations((-328.0134985, -43.70328926)):
            Rectangle(SKETCH72_W, SKETCH72_H)
    extrude(amount=BOSS_EXTRUDE34_DEPTH)

    # Sketch73 → Boss-Extrude35 (add)
    with BuildSketch(Plane(origin=(308.447577773, 0, 107.255817179), x_dir=(-0.32843786176701534, 0, 0.9445255798324951), z_dir=(-0.9445255798324951, 0, -0.32843786176701534))):
        with Locations((856.429727564, -43.70328926)):
            Rectangle(SKETCH73_W, SKETCH73_H)
    extrude(amount=BOSS_EXTRUDE35_DEPTH)

    # Sketch74 → Cut-Extrude27 (cut)
    with BuildSketch(Plane.XZ.offset(45.17)):
        with Locations(Location((18.439626133, 912.298073036, 0), (0, 0, 270))):
            Circle(SKETCH74_R)
        with Locations(Location((8.663786379, 908.898741176, 0), (0, 0, 270))):
            Circle(SKETCH74_R)
    extrude(amount=-CUT_EXTRUDE27_DEPTH, mode=Mode.SUBTRACT)


with BuildPart() as body_2_3:
    # Mirror3: read off the stored shape, not the designer's step
    # Mirror3: mirrored copy
    add(body_2_2.part.mirror(Plane(origin=(0, -42.1, 0), x_dir=(1, 0, 0), z_dir=(0, 1, 0))))


with BuildPart() as body_2_4:
    # Mirror4: read off the stored shape, not the designer's step
    # Mirror4: mirrored copy
    add(body_2_3.part.mirror(Plane(origin=(0, -42.1, 0), x_dir=(1, 0, 0), z_dir=(0, 1, 0))))


with BuildPart() as body_2_5:
    # Mirror5: read off the stored shape, not the designer's step
    # Mirror5: mirrored copy
    add(body_2_4.part.mirror(Plane(origin=(0, -42.1, 0), x_dir=(1, 0, 0), z_dir=(0, 1, 0))))

    # Sketch75 → Cut-Extrude28 (cut, two sides: drawn at the far end of the back side and taken through both)
    with BuildSketch(Plane.ZY.offset(49.796128585).offset(-CUT_EXTRUDE28_DEPTH_BACK)):
        with Locations(Location((996.061659537, -60.2, 0), (0, 0, 180))):
            Circle(SKETCH75_R)
        with Locations(Location((972.069638843, -60.199999995, 0), (0, 0, 180))):
            Circle(SKETCH75_R_2)
    extrude(amount=CUT_EXTRUDE28_DEPTH + CUT_EXTRUDE28_DEPTH_BACK, mode=Mode.SUBTRACT)

    # Sketch76 → Cut-Extrude29 (cut, two sides: drawn at the far end of the back side and taken through both)
    with BuildSketch(Plane(origin=(-14.66612858, 0, 0), x_dir=(0, 0, -1), z_dir=(1, 0, 0)).offset(-CUT_EXTRUDE29_DEPTH_BACK)):
        with Locations(Location((-972.069638843, -60.2, 0), (0, 0, 2.32e-07))):
            Circle(SKETCH76_R)
        with Locations((-996.061659537, -60.2)):
            Circle(SKETCH76_R)
    extrude(amount=CUT_EXTRUDE29_DEPTH + CUT_EXTRUDE29_DEPTH_BACK, mode=Mode.SUBTRACT)

    # Sketch77 → Cut-Extrude30 (cut)
    with BuildSketch(Plane(origin=(311.092249396, 0, 108.175443191), x_dir=(0.32843786176703343, 0, -0.9445255798324887), z_dir=(0.9445255798324889, 0, 0.3284378617670335))):
        with Locations((-868.440574332, -60.2)):
            Circle(SKETCH77_R)
    extrude(amount=-CUT_EXTRUDE30_DEPTH, mode=Mode.SUBTRACT)

    # Sketch78 → Cut-Extrude31 (cut)
    with BuildSketch(Plane(origin=(278.112718549, 0, 96.707541395), x_dir=(-0.32843786176743106, 0, 0.9445255798323505), z_dir=(-0.9445255798323505, 0, -0.32843786176743106))):
        with Locations(Location((868.440574361, -60.2, 0), (0, 0, 180))):
            Circle(SKETCH78_R)
    extrude(amount=-CUT_EXTRUDE31_DEPTH, mode=Mode.SUBTRACT)

    # Sketch79 → Boss-Extrude36 (add)
    with BuildSketch(Plane.XZ.offset(66.2)):
        with BuildLine():
            Line((-24.266128585, 978.146354464), (-24.266128585, 988.183184315))
            ThreePointArc((-24.266128585, 988.183184315), (-31.766128585, 984.063765137), (-39.266128585, 988.183184315))
            Line((-39.266128585, 988.183184315), (-39.266128585, 978.146354464))
            Line((-39.266128585, 978.146354464), (-24.266128585, 978.146354464))
        make_face()
    extrude(amount=-BOSS_EXTRUDE36_DEPTH)

    # Sketch81 → Boss-Extrude38 (add)
    with BuildSketch(Plane(origin=(0, -63.2, 0), x_dir=(1, 0, 0), z_dir=(0, 1, 0))):
        with BuildLine():
            Line((11.67040627, -948.187810964), (18.227834043, -929.329880771))
            ThreePointArc((18.227834043, -929.329880771), (5.15828141, -934.170581208), (-1.418744216, -921.882850715))
            Line((-1.418744216, -921.882850715), (-6.699400727, -937.069026653))
            Line((-6.699400727, -937.069026653), (11.67040627, -948.187810964))
        make_face()
    extrude(amount=-BOSS_EXTRUDE38_DEPTH)

    # Sketch82 → Cut-Extrude32 (cut)
    with BuildSketch(Plane.XZ.offset(66.2)):
        Polygon((-32.448883016, 974.886354464), (-36.448883016, 974.886354464), (-36.448883016, 971.886354464), (-28.448883016, 971.886354464), (-28.448883016, 974.886354464), align=None)
    extrude(amount=-CUT_EXTRUDE32_DEPTH, mode=Mode.SUBTRACT)

    # Sketch88 → Cut-Extrude33 (cut)
    with BuildSketch(Plane(origin=(0, -66.2, 0), x_dir=(-1, 0, 0), z_dir=(0, -1, 0))):
        Polygon((0.985313585, -965.693308303), (8.541518224, -963.065805409), (7.556204639, -960.232228669), (0, -962.859731564), align=None)
    extrude(amount=-CUT_EXTRUDE33_DEPTH, mode=Mode.SUBTRACT)

    # Sketch85 → Cut-Extrude34 (cut)
    with BuildSketch(Plane.XZ.offset(66.2)):
        Polygon((4.885275223, 947.396800093), (1.107172904, 946.083048646), (-2.670929416, 944.769297199), (-1.68561583, 941.935720459), (5.870588808, 944.563223353), align=None)
    extrude(amount=-CUT_EXTRUDE34_DEPTH, mode=Mode.SUBTRACT)


solid = body_2_5.part
